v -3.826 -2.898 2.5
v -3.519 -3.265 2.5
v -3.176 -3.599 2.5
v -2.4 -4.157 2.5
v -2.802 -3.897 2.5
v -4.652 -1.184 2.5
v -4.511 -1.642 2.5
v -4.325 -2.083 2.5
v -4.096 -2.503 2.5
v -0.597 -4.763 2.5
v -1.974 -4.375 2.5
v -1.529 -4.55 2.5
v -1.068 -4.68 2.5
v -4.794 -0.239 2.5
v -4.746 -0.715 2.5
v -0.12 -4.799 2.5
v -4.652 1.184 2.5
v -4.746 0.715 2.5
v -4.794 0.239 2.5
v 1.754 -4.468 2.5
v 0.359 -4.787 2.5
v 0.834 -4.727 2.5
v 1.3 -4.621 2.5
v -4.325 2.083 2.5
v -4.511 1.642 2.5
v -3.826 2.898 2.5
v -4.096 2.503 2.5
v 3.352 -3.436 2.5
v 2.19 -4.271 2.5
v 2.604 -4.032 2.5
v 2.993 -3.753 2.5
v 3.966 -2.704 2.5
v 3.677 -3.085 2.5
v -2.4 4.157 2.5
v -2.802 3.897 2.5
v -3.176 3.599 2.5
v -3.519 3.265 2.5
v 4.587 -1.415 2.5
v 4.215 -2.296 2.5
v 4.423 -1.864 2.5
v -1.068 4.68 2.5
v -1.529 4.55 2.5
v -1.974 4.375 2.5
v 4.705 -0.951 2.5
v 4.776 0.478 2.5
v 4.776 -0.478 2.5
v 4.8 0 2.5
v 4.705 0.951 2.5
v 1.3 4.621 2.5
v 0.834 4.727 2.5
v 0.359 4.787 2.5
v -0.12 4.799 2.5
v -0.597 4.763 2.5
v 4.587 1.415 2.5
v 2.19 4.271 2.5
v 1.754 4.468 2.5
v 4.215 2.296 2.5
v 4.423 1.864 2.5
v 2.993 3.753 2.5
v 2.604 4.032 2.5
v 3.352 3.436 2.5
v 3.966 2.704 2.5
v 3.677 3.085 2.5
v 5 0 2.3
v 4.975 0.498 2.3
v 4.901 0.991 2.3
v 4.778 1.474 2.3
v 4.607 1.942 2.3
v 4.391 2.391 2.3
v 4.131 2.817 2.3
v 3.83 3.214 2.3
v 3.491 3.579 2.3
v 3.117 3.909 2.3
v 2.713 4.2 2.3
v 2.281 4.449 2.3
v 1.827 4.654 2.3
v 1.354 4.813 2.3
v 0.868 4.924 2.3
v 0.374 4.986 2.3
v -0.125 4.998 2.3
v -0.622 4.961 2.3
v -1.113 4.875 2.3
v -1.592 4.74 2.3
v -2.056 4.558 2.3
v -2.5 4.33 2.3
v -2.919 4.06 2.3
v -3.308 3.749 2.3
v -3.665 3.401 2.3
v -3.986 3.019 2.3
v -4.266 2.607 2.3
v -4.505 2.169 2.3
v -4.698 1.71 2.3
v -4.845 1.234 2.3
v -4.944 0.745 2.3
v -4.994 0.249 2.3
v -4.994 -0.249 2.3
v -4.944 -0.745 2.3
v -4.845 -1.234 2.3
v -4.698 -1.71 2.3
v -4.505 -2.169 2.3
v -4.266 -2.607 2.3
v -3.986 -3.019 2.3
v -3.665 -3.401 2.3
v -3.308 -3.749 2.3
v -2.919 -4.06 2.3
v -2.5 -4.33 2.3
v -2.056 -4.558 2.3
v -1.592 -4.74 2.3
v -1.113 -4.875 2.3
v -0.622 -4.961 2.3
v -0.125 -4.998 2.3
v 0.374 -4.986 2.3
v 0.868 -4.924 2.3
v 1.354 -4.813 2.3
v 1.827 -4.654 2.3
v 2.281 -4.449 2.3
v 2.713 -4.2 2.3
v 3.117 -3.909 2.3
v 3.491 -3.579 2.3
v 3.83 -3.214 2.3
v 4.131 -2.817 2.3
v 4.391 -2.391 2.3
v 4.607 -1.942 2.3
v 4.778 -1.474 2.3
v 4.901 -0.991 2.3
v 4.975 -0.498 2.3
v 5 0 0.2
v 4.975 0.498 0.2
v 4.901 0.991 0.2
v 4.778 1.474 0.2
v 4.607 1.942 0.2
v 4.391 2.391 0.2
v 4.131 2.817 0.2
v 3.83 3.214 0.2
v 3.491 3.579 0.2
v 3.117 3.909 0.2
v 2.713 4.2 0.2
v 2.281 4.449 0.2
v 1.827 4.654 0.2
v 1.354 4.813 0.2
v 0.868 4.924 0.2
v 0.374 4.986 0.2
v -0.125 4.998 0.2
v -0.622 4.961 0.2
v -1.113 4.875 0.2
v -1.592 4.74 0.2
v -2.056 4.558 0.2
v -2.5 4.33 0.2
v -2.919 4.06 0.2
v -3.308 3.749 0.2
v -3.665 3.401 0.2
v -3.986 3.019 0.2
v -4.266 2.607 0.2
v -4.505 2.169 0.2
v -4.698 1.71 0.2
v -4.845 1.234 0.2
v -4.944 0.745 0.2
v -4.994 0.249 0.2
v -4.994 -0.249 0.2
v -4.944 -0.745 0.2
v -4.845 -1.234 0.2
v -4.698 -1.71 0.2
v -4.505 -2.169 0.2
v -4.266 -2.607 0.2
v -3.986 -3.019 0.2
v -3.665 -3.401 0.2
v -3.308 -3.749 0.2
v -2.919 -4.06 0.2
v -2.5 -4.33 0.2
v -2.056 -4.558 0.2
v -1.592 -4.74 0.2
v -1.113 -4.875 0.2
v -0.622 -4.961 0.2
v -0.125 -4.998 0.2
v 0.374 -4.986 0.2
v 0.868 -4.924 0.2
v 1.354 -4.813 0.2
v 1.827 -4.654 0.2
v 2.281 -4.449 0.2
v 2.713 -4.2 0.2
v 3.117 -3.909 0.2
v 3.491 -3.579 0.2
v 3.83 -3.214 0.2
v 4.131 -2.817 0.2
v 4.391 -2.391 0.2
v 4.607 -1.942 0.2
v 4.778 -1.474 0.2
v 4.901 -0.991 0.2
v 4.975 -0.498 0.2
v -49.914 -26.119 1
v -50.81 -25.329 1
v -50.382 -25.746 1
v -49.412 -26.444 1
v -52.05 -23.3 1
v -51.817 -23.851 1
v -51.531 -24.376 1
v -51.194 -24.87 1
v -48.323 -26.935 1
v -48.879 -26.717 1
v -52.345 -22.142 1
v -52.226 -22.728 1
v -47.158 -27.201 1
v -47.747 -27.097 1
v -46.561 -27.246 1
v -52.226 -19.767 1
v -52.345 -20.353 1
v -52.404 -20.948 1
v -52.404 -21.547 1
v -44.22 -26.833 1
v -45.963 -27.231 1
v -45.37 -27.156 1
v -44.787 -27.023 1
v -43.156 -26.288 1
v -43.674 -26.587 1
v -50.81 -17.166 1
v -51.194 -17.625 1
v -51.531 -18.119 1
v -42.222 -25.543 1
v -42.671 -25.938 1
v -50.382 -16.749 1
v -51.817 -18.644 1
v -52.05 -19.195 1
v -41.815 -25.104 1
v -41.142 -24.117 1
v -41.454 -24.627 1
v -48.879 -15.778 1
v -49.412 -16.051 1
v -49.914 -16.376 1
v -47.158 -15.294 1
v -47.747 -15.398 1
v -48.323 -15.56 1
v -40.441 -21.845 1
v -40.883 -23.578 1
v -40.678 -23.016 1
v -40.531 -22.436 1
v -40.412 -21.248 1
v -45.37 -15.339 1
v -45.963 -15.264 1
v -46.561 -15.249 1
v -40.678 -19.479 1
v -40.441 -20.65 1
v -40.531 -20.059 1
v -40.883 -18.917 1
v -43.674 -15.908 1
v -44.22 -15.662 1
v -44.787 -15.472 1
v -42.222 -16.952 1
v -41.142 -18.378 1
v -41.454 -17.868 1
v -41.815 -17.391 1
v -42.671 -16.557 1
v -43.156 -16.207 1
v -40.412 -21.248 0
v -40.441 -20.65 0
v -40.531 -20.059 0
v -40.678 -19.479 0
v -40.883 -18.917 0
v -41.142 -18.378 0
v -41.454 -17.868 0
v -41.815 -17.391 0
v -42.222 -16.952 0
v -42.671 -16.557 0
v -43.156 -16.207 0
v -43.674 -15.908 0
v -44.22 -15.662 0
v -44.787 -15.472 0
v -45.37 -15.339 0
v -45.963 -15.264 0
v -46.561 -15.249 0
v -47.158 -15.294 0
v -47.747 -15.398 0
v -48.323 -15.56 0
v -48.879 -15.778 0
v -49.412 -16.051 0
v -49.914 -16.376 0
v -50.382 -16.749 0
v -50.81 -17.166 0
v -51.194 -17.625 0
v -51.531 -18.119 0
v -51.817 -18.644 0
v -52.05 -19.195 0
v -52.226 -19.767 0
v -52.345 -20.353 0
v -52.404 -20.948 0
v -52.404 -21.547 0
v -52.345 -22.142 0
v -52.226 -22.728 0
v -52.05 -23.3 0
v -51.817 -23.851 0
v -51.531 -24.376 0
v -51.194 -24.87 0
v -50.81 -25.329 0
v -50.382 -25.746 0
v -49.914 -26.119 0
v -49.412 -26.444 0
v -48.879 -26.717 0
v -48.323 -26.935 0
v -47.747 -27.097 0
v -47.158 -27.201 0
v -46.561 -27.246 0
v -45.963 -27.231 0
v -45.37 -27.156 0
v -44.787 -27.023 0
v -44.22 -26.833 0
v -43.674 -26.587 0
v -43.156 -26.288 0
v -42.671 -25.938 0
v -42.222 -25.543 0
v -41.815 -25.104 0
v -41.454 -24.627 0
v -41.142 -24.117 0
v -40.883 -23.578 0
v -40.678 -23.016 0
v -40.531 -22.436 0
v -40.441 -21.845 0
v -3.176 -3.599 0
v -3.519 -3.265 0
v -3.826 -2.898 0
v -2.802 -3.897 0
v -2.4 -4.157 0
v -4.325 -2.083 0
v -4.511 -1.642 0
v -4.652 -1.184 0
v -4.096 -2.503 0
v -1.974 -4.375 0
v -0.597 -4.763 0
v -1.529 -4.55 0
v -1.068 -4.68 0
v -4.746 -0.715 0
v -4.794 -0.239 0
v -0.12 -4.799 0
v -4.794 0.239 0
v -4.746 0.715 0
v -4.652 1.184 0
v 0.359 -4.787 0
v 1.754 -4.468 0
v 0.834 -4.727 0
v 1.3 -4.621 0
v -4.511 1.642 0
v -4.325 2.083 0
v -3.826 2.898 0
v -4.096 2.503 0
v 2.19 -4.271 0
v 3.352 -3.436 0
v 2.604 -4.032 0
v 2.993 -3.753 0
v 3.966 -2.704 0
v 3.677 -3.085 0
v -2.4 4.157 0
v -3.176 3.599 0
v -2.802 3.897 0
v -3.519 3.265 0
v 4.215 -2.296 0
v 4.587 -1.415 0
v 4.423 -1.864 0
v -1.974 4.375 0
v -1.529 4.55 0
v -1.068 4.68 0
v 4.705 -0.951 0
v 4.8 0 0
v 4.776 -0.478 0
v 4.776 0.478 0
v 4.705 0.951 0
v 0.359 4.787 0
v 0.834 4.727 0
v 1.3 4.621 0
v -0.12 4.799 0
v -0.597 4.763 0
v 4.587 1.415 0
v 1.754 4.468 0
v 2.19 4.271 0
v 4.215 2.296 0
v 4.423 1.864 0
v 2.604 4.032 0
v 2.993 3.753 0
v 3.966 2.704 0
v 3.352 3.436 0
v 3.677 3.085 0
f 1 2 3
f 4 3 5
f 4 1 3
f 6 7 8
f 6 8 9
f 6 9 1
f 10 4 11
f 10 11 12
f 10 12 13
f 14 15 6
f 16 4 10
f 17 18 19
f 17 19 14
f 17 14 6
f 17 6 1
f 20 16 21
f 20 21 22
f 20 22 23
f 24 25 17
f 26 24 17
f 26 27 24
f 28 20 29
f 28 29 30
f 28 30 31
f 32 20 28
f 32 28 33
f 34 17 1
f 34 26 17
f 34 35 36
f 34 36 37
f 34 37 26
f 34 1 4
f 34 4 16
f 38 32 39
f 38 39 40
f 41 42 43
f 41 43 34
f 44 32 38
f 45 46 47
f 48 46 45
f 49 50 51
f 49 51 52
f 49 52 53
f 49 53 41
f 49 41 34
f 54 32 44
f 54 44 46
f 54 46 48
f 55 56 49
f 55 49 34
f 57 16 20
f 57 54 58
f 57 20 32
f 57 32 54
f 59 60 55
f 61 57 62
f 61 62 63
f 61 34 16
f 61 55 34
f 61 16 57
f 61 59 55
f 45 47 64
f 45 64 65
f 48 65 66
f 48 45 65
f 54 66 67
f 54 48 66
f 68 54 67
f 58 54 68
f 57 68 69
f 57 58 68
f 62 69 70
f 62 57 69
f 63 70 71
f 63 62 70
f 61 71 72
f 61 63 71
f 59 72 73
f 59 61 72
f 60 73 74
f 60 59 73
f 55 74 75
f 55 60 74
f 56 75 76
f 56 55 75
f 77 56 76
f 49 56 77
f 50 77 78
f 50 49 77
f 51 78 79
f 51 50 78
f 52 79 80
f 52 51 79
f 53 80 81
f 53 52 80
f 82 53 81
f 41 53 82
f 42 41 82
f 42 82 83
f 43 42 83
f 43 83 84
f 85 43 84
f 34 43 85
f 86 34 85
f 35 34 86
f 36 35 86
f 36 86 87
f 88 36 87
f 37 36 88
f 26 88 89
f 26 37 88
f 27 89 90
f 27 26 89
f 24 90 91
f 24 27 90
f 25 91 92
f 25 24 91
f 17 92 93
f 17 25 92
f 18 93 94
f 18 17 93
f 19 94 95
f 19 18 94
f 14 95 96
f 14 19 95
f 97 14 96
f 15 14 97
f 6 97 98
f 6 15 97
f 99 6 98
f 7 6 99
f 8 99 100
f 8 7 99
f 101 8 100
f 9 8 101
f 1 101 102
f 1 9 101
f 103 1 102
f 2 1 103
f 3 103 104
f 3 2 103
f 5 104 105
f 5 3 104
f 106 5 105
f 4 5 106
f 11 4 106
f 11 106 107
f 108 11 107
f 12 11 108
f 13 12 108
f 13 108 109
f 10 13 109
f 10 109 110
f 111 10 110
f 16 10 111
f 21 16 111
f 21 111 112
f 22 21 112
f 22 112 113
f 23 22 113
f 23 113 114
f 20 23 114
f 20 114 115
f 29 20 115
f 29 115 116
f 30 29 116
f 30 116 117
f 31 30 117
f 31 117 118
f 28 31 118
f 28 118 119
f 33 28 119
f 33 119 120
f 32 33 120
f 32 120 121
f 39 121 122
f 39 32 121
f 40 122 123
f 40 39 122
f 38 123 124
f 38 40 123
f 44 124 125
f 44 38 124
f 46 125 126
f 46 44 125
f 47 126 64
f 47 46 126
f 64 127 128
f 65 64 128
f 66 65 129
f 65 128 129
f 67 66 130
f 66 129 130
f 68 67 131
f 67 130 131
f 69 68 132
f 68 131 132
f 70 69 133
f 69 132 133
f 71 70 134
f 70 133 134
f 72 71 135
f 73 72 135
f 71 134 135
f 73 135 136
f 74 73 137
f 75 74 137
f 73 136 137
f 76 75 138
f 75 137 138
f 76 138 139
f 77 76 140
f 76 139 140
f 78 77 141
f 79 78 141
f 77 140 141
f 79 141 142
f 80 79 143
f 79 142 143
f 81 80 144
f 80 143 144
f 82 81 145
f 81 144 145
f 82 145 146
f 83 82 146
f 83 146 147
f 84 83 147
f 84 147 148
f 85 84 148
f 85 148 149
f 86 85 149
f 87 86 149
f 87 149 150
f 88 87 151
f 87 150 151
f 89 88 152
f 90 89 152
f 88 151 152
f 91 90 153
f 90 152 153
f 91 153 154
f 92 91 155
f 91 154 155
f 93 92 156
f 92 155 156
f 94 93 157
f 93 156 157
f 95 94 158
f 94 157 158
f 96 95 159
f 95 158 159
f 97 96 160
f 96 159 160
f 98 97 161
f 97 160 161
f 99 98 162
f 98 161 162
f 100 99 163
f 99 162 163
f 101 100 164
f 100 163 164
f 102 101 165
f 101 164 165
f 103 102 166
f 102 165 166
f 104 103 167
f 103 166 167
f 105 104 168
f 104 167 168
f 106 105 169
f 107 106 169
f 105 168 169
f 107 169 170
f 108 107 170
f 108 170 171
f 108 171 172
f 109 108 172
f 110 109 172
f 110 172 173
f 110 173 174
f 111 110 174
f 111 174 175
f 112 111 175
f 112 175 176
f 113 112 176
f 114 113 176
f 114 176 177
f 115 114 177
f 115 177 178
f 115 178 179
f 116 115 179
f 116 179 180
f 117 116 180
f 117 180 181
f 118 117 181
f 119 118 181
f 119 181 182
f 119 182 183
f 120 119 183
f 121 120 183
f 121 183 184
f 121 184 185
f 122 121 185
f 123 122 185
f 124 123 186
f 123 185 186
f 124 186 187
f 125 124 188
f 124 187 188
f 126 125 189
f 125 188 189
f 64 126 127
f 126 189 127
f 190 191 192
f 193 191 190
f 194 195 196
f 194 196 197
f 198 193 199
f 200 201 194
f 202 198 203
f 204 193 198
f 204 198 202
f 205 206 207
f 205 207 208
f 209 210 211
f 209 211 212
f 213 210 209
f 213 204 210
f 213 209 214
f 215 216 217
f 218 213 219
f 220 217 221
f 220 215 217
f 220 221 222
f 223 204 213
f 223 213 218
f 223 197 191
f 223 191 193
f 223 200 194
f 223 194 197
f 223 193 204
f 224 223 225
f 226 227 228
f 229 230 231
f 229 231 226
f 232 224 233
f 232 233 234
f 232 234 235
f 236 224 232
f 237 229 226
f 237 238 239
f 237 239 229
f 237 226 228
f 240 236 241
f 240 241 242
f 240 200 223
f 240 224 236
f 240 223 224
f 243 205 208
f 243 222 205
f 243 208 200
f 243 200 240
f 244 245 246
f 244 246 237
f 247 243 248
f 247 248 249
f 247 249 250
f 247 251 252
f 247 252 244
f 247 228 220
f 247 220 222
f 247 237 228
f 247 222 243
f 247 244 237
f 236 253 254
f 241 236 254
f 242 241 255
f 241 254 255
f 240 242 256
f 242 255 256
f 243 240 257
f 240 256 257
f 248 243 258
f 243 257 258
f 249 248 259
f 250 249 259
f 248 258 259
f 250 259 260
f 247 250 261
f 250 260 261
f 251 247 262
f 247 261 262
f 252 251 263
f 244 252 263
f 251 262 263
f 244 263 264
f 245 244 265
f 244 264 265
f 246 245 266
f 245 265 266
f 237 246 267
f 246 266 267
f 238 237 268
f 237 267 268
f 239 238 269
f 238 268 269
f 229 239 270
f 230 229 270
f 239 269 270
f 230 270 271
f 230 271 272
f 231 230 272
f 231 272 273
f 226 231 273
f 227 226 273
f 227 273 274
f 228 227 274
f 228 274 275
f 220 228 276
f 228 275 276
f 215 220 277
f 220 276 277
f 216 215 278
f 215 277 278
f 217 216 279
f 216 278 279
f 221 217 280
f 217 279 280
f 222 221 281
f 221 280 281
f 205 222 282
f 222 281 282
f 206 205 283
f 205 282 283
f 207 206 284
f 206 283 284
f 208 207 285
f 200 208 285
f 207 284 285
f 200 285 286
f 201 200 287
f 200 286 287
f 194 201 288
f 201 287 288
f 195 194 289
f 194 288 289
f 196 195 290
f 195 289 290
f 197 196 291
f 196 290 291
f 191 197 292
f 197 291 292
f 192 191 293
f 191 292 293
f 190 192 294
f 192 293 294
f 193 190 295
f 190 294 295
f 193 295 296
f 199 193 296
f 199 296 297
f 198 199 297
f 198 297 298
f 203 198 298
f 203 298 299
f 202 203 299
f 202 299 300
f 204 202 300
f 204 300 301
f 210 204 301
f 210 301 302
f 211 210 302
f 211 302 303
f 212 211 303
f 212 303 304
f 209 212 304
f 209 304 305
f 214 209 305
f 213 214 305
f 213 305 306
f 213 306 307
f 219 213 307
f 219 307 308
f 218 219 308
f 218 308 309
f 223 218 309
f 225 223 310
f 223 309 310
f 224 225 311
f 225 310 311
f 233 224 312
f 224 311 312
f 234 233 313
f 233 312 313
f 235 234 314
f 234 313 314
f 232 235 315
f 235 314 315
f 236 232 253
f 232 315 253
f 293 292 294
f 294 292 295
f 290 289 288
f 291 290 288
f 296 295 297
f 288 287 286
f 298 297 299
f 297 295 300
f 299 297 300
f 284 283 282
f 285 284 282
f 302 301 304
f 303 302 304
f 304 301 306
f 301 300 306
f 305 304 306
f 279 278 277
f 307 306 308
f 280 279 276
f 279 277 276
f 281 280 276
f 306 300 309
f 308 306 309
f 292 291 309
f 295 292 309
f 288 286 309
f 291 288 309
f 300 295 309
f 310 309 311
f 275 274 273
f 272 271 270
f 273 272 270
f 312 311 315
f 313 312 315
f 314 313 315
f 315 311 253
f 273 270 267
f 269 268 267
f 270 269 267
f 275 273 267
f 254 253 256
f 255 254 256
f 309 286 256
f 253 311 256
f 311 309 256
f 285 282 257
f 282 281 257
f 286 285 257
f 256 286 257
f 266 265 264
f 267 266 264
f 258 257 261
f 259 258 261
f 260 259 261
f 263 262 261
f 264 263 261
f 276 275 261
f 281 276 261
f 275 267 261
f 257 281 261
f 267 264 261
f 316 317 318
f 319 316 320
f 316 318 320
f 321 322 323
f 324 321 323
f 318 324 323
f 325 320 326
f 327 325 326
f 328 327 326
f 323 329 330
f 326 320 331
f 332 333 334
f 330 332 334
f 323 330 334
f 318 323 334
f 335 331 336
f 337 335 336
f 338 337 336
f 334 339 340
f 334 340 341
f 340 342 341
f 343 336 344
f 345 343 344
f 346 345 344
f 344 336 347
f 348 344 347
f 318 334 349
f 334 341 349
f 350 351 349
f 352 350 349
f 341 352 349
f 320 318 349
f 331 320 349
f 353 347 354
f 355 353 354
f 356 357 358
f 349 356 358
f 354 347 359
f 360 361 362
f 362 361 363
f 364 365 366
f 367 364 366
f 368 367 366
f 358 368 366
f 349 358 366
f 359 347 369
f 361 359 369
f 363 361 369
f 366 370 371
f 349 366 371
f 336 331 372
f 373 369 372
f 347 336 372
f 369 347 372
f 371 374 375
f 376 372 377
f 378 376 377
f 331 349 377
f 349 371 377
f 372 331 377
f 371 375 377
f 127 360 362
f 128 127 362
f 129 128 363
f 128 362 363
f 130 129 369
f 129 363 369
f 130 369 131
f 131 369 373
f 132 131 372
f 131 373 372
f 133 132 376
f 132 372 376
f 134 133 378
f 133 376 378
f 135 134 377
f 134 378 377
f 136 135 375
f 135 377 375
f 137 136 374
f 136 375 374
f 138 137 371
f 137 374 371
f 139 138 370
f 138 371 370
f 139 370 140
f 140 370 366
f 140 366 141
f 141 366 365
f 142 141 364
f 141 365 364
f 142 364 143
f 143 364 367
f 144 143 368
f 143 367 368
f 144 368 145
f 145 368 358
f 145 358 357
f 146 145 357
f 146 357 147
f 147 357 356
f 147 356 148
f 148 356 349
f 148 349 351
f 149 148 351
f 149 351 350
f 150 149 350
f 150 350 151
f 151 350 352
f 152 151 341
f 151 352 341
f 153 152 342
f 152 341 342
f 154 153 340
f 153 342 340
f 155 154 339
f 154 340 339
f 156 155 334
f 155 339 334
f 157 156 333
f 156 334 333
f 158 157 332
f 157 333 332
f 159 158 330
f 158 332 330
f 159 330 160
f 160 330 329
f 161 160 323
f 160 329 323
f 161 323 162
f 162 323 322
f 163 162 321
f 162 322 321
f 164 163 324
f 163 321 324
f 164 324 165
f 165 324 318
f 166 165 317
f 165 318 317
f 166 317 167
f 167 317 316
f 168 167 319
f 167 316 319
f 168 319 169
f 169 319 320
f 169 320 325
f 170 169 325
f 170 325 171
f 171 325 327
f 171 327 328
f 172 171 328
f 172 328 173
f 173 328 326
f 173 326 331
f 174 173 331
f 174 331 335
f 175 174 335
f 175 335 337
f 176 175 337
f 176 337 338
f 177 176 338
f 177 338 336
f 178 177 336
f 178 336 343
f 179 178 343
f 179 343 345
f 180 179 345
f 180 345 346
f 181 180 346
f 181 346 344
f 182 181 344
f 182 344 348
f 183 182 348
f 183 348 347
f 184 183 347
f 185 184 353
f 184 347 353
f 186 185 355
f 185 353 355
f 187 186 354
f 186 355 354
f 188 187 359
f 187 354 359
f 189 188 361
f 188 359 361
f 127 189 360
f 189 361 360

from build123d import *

# Parameters (mm, degrees)
F0_R     = 5
F1_DEPTH = 2.5
F2_SIZE  = 0.2
F3_R     = 6
F4_DEPTH = 1


with BuildPart() as f1:
    # F0 (on Top) → F1 (new body)
    with BuildSketch(Plane.XY):
        Circle(F0_R)
    extrude(amount=F1_DEPTH)

    # F2
    f2_edges = [f1.edges().sort_by_distance(p)[0] for p in [
        (-5, 0, 2.5),
        (-5, 0, 0),
    ]]
    chamfer(f2_edges, length=F2_SIZE)


with BuildPart() as f4:
    # F3 (on Top) → F4 (new body)
    with BuildSketch(Plane.XY):
        with Locations((-46.411626, -21.24751)):
            Circle(F3_R)
    extrude(amount=F4_DEPTH)


solid = Compound([f1.part, f4.part])
